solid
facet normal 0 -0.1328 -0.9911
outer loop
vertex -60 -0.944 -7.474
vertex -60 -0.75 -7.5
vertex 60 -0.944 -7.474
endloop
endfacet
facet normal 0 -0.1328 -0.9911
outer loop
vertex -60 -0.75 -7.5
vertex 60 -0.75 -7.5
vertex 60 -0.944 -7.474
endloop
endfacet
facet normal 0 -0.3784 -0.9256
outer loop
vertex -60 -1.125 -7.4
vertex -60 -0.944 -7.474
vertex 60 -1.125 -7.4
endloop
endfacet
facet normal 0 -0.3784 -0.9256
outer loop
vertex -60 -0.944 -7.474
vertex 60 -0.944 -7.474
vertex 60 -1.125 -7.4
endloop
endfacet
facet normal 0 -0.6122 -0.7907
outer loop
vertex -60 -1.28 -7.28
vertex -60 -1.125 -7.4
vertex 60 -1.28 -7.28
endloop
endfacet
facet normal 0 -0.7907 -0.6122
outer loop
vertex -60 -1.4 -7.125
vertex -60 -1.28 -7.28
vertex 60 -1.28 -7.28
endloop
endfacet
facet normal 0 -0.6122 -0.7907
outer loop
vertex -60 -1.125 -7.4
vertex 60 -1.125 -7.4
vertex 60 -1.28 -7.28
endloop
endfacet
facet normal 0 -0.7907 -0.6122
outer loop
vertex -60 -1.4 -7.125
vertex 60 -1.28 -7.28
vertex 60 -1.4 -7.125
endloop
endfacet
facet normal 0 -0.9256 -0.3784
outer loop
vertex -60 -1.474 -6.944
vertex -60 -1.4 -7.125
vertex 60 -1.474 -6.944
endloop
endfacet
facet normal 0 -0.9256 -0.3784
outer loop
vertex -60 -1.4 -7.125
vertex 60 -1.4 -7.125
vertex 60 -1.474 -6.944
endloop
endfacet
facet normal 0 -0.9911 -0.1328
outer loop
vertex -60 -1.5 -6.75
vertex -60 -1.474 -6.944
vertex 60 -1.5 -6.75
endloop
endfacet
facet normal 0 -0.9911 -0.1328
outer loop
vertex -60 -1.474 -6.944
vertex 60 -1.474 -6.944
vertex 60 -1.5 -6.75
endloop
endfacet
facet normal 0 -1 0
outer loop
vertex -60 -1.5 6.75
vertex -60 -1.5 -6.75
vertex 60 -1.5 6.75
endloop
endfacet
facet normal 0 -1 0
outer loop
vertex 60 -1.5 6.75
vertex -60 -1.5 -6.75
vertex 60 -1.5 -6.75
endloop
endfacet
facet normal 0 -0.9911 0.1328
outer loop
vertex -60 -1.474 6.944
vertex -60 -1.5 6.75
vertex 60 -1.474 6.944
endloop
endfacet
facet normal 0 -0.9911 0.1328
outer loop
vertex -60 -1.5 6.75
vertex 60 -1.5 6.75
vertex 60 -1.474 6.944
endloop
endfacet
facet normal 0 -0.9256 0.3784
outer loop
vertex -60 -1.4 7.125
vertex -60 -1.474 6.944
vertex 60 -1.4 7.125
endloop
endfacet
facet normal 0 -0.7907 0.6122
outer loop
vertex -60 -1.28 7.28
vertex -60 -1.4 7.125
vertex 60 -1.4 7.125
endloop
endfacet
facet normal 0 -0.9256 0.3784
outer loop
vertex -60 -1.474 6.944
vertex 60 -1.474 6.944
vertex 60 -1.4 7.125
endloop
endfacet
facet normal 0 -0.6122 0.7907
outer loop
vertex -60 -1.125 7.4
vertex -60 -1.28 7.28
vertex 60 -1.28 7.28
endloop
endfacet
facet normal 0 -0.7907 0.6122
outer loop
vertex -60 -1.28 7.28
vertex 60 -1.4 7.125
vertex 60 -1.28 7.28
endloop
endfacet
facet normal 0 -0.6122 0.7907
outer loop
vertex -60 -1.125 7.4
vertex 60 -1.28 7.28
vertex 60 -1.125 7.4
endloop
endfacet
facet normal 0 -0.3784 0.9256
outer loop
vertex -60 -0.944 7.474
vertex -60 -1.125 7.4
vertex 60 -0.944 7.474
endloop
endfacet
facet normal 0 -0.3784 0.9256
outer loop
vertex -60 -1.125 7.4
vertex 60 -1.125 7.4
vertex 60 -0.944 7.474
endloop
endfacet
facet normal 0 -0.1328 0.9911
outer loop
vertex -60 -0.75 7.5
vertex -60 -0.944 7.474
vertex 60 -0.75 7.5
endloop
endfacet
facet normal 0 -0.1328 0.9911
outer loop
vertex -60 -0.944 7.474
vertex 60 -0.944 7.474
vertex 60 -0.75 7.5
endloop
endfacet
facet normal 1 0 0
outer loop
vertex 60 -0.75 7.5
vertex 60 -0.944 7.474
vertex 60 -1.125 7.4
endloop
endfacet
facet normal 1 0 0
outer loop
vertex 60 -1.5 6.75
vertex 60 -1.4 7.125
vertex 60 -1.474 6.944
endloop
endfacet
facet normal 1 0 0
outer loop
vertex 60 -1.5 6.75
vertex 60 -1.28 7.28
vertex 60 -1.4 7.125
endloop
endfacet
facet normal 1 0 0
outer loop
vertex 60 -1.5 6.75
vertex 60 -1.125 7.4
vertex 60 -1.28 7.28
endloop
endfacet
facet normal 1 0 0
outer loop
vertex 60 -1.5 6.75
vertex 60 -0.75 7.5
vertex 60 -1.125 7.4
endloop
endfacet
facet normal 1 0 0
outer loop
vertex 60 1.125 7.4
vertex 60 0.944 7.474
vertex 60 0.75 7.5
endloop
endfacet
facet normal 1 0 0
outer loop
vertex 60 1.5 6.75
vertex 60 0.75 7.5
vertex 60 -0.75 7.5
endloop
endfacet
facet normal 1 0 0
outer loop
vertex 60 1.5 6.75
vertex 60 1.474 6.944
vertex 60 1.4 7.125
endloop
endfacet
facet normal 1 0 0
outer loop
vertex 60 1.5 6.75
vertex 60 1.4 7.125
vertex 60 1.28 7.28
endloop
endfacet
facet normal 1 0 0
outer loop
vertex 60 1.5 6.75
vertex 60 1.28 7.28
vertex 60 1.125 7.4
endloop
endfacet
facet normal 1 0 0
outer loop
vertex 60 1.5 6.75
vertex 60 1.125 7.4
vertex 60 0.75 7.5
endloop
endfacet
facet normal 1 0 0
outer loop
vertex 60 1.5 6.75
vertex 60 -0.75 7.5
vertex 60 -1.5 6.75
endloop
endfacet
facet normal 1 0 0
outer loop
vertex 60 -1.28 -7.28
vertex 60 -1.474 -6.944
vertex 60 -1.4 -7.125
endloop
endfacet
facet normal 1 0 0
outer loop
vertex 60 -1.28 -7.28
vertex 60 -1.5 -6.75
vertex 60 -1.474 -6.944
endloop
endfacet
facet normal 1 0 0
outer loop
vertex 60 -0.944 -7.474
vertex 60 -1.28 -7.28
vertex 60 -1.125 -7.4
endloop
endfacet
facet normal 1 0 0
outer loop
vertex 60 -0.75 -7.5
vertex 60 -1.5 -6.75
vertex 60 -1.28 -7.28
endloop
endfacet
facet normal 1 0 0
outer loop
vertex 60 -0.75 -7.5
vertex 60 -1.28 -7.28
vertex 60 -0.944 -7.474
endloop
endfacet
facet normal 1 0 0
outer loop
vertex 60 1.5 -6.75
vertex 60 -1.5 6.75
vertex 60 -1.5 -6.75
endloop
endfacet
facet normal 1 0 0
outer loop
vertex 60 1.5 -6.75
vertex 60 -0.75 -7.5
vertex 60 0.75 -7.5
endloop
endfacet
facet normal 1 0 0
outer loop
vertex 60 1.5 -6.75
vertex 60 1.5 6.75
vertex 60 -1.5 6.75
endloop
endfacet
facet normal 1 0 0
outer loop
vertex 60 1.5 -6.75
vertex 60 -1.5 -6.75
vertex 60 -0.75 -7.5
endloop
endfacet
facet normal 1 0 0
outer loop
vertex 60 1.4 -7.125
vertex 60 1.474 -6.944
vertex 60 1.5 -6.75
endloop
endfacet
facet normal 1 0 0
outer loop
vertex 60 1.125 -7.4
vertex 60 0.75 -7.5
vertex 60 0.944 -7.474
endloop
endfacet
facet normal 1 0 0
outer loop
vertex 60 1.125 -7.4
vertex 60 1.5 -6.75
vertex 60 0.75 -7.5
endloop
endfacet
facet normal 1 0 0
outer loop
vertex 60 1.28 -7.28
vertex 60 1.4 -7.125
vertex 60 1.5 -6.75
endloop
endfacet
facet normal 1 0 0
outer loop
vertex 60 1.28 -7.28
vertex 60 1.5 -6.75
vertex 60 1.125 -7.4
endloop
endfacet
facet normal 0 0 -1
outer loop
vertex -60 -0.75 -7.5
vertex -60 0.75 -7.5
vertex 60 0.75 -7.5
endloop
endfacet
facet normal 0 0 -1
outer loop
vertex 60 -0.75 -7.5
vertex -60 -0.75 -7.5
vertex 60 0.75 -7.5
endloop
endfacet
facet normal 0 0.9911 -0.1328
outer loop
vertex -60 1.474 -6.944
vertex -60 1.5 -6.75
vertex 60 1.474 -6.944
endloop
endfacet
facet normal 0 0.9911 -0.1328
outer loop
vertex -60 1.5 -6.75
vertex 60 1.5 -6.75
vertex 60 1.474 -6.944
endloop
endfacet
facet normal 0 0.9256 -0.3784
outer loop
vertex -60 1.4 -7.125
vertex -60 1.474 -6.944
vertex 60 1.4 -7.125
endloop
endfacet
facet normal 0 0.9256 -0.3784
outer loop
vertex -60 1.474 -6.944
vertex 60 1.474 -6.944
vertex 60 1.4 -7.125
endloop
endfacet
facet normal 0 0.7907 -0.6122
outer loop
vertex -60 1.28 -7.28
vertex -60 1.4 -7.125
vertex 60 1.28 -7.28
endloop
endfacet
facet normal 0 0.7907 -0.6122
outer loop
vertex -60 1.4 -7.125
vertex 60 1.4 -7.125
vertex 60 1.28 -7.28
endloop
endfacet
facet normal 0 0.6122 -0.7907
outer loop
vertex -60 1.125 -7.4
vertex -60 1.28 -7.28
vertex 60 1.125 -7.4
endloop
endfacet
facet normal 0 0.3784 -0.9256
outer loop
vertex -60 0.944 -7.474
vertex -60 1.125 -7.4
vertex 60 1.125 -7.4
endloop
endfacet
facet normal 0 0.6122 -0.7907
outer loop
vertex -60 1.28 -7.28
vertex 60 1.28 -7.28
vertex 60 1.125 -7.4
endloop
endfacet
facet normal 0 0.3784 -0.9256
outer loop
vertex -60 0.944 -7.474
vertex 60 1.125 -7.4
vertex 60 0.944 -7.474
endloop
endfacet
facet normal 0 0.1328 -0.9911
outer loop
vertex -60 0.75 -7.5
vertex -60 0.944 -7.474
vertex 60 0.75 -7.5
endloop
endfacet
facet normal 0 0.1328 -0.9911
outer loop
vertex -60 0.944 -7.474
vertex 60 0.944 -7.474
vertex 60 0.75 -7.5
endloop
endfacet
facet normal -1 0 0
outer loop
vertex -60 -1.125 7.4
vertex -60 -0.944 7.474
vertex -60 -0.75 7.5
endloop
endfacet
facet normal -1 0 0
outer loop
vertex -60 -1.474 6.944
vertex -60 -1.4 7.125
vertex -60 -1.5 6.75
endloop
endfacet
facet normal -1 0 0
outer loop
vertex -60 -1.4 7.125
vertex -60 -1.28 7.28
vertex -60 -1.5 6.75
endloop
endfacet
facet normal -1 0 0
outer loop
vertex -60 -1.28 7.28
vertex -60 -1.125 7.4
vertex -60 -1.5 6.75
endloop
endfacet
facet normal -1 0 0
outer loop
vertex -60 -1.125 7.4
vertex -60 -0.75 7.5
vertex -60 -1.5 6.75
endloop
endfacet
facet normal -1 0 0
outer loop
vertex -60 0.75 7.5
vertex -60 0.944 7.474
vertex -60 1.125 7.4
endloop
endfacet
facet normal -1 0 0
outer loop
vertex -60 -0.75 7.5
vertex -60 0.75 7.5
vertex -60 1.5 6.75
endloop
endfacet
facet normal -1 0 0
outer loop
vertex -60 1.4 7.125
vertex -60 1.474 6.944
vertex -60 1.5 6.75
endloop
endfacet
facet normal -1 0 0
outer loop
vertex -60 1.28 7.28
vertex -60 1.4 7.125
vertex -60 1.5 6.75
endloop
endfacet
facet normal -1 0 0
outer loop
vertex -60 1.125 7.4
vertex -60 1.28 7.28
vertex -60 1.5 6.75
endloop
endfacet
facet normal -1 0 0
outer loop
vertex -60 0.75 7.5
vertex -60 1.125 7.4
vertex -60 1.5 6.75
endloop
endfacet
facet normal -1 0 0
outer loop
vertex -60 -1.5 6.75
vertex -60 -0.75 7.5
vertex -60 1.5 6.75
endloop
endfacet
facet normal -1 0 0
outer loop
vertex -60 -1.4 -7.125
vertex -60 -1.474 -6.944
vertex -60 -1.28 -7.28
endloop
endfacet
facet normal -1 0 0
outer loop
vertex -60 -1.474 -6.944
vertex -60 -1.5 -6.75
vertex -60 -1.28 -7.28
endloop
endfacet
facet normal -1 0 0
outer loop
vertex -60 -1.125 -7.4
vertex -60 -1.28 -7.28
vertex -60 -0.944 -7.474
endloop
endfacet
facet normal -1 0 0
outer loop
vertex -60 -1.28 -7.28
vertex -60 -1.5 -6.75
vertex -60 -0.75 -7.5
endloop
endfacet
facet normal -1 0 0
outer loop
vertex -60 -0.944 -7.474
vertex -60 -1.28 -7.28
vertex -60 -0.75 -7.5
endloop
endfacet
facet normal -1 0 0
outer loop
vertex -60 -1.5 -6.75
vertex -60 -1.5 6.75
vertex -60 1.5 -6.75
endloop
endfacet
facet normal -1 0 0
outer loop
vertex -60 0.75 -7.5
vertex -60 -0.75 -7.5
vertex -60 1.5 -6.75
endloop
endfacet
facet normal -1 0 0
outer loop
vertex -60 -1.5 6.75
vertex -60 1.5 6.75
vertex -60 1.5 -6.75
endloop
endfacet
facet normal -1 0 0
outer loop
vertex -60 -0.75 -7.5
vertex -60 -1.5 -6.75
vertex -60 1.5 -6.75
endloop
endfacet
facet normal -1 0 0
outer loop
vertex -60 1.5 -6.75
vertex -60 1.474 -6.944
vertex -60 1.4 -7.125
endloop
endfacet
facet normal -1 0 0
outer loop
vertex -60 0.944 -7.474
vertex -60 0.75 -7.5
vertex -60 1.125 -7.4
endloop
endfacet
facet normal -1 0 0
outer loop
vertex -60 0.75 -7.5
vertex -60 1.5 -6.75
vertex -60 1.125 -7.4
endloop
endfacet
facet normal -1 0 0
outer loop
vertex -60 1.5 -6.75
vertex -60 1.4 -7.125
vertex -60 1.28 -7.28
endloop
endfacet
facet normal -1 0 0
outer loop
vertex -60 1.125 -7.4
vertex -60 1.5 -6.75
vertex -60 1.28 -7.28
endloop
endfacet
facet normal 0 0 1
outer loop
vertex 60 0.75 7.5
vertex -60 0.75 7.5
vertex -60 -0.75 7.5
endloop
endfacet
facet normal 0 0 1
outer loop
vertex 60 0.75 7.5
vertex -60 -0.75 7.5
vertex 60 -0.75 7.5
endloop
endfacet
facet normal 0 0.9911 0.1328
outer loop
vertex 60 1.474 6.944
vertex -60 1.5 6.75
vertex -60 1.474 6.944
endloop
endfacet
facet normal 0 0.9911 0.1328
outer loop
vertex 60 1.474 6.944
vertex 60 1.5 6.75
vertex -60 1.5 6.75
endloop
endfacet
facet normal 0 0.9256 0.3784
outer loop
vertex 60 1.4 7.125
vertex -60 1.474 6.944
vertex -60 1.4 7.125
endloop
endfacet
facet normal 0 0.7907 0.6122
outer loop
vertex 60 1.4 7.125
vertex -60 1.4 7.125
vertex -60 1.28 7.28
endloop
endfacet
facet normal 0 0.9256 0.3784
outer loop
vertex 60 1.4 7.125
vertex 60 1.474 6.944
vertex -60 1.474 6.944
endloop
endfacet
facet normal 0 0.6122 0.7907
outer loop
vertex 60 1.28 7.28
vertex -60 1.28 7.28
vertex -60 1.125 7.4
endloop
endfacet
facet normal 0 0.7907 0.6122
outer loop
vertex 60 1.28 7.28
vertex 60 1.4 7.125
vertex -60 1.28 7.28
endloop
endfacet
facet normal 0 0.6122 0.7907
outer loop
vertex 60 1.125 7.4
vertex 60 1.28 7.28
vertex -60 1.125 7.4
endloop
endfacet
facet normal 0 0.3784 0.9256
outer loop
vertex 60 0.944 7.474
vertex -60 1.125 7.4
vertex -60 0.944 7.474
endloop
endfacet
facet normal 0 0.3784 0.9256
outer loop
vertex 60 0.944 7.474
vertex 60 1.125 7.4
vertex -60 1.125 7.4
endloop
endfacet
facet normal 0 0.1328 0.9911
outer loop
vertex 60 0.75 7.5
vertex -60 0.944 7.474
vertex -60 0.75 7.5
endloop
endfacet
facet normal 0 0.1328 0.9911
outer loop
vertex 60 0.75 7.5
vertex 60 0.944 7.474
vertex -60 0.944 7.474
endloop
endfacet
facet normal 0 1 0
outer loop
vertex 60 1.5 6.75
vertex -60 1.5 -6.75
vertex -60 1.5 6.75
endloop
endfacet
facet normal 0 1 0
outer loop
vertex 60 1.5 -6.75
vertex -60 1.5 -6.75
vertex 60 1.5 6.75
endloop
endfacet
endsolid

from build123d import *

# Parameters (mm, degrees)
SKETCH_1_W      = 120
SKETCH_1_H      = 15
EXTRUDE_1_DEPTH = 1.5
FILLET_1_R      = 0.75


with BuildPart() as part:
    # ｽｹｯﾁ1 → ﾎﾞｽ - 押し出し1 (new, symmetric)
    with BuildSketch(Plane(origin=(0, 0, 0), x_dir=(1, 0, 0), z_dir=(0, 1, 0))):
        Rectangle(SKETCH_1_W, SKETCH_1_H)
    extrude(amount=EXTRUDE_1_DEPTH, both=True)

    # ﾌｨﾚｯﾄ1
    fillet_1_edges = [part.edges().sort_by_distance(p)[0] for p in [
        (0, 1.5, 7.5),
        (0, -1.5, 7.5),
        (0, -1.5, -7.5),
        (0, 1.5, -7.5),
    ]]
    fillet(fillet_1_edges, radius=FILLET_1_R)


solid = part.part
